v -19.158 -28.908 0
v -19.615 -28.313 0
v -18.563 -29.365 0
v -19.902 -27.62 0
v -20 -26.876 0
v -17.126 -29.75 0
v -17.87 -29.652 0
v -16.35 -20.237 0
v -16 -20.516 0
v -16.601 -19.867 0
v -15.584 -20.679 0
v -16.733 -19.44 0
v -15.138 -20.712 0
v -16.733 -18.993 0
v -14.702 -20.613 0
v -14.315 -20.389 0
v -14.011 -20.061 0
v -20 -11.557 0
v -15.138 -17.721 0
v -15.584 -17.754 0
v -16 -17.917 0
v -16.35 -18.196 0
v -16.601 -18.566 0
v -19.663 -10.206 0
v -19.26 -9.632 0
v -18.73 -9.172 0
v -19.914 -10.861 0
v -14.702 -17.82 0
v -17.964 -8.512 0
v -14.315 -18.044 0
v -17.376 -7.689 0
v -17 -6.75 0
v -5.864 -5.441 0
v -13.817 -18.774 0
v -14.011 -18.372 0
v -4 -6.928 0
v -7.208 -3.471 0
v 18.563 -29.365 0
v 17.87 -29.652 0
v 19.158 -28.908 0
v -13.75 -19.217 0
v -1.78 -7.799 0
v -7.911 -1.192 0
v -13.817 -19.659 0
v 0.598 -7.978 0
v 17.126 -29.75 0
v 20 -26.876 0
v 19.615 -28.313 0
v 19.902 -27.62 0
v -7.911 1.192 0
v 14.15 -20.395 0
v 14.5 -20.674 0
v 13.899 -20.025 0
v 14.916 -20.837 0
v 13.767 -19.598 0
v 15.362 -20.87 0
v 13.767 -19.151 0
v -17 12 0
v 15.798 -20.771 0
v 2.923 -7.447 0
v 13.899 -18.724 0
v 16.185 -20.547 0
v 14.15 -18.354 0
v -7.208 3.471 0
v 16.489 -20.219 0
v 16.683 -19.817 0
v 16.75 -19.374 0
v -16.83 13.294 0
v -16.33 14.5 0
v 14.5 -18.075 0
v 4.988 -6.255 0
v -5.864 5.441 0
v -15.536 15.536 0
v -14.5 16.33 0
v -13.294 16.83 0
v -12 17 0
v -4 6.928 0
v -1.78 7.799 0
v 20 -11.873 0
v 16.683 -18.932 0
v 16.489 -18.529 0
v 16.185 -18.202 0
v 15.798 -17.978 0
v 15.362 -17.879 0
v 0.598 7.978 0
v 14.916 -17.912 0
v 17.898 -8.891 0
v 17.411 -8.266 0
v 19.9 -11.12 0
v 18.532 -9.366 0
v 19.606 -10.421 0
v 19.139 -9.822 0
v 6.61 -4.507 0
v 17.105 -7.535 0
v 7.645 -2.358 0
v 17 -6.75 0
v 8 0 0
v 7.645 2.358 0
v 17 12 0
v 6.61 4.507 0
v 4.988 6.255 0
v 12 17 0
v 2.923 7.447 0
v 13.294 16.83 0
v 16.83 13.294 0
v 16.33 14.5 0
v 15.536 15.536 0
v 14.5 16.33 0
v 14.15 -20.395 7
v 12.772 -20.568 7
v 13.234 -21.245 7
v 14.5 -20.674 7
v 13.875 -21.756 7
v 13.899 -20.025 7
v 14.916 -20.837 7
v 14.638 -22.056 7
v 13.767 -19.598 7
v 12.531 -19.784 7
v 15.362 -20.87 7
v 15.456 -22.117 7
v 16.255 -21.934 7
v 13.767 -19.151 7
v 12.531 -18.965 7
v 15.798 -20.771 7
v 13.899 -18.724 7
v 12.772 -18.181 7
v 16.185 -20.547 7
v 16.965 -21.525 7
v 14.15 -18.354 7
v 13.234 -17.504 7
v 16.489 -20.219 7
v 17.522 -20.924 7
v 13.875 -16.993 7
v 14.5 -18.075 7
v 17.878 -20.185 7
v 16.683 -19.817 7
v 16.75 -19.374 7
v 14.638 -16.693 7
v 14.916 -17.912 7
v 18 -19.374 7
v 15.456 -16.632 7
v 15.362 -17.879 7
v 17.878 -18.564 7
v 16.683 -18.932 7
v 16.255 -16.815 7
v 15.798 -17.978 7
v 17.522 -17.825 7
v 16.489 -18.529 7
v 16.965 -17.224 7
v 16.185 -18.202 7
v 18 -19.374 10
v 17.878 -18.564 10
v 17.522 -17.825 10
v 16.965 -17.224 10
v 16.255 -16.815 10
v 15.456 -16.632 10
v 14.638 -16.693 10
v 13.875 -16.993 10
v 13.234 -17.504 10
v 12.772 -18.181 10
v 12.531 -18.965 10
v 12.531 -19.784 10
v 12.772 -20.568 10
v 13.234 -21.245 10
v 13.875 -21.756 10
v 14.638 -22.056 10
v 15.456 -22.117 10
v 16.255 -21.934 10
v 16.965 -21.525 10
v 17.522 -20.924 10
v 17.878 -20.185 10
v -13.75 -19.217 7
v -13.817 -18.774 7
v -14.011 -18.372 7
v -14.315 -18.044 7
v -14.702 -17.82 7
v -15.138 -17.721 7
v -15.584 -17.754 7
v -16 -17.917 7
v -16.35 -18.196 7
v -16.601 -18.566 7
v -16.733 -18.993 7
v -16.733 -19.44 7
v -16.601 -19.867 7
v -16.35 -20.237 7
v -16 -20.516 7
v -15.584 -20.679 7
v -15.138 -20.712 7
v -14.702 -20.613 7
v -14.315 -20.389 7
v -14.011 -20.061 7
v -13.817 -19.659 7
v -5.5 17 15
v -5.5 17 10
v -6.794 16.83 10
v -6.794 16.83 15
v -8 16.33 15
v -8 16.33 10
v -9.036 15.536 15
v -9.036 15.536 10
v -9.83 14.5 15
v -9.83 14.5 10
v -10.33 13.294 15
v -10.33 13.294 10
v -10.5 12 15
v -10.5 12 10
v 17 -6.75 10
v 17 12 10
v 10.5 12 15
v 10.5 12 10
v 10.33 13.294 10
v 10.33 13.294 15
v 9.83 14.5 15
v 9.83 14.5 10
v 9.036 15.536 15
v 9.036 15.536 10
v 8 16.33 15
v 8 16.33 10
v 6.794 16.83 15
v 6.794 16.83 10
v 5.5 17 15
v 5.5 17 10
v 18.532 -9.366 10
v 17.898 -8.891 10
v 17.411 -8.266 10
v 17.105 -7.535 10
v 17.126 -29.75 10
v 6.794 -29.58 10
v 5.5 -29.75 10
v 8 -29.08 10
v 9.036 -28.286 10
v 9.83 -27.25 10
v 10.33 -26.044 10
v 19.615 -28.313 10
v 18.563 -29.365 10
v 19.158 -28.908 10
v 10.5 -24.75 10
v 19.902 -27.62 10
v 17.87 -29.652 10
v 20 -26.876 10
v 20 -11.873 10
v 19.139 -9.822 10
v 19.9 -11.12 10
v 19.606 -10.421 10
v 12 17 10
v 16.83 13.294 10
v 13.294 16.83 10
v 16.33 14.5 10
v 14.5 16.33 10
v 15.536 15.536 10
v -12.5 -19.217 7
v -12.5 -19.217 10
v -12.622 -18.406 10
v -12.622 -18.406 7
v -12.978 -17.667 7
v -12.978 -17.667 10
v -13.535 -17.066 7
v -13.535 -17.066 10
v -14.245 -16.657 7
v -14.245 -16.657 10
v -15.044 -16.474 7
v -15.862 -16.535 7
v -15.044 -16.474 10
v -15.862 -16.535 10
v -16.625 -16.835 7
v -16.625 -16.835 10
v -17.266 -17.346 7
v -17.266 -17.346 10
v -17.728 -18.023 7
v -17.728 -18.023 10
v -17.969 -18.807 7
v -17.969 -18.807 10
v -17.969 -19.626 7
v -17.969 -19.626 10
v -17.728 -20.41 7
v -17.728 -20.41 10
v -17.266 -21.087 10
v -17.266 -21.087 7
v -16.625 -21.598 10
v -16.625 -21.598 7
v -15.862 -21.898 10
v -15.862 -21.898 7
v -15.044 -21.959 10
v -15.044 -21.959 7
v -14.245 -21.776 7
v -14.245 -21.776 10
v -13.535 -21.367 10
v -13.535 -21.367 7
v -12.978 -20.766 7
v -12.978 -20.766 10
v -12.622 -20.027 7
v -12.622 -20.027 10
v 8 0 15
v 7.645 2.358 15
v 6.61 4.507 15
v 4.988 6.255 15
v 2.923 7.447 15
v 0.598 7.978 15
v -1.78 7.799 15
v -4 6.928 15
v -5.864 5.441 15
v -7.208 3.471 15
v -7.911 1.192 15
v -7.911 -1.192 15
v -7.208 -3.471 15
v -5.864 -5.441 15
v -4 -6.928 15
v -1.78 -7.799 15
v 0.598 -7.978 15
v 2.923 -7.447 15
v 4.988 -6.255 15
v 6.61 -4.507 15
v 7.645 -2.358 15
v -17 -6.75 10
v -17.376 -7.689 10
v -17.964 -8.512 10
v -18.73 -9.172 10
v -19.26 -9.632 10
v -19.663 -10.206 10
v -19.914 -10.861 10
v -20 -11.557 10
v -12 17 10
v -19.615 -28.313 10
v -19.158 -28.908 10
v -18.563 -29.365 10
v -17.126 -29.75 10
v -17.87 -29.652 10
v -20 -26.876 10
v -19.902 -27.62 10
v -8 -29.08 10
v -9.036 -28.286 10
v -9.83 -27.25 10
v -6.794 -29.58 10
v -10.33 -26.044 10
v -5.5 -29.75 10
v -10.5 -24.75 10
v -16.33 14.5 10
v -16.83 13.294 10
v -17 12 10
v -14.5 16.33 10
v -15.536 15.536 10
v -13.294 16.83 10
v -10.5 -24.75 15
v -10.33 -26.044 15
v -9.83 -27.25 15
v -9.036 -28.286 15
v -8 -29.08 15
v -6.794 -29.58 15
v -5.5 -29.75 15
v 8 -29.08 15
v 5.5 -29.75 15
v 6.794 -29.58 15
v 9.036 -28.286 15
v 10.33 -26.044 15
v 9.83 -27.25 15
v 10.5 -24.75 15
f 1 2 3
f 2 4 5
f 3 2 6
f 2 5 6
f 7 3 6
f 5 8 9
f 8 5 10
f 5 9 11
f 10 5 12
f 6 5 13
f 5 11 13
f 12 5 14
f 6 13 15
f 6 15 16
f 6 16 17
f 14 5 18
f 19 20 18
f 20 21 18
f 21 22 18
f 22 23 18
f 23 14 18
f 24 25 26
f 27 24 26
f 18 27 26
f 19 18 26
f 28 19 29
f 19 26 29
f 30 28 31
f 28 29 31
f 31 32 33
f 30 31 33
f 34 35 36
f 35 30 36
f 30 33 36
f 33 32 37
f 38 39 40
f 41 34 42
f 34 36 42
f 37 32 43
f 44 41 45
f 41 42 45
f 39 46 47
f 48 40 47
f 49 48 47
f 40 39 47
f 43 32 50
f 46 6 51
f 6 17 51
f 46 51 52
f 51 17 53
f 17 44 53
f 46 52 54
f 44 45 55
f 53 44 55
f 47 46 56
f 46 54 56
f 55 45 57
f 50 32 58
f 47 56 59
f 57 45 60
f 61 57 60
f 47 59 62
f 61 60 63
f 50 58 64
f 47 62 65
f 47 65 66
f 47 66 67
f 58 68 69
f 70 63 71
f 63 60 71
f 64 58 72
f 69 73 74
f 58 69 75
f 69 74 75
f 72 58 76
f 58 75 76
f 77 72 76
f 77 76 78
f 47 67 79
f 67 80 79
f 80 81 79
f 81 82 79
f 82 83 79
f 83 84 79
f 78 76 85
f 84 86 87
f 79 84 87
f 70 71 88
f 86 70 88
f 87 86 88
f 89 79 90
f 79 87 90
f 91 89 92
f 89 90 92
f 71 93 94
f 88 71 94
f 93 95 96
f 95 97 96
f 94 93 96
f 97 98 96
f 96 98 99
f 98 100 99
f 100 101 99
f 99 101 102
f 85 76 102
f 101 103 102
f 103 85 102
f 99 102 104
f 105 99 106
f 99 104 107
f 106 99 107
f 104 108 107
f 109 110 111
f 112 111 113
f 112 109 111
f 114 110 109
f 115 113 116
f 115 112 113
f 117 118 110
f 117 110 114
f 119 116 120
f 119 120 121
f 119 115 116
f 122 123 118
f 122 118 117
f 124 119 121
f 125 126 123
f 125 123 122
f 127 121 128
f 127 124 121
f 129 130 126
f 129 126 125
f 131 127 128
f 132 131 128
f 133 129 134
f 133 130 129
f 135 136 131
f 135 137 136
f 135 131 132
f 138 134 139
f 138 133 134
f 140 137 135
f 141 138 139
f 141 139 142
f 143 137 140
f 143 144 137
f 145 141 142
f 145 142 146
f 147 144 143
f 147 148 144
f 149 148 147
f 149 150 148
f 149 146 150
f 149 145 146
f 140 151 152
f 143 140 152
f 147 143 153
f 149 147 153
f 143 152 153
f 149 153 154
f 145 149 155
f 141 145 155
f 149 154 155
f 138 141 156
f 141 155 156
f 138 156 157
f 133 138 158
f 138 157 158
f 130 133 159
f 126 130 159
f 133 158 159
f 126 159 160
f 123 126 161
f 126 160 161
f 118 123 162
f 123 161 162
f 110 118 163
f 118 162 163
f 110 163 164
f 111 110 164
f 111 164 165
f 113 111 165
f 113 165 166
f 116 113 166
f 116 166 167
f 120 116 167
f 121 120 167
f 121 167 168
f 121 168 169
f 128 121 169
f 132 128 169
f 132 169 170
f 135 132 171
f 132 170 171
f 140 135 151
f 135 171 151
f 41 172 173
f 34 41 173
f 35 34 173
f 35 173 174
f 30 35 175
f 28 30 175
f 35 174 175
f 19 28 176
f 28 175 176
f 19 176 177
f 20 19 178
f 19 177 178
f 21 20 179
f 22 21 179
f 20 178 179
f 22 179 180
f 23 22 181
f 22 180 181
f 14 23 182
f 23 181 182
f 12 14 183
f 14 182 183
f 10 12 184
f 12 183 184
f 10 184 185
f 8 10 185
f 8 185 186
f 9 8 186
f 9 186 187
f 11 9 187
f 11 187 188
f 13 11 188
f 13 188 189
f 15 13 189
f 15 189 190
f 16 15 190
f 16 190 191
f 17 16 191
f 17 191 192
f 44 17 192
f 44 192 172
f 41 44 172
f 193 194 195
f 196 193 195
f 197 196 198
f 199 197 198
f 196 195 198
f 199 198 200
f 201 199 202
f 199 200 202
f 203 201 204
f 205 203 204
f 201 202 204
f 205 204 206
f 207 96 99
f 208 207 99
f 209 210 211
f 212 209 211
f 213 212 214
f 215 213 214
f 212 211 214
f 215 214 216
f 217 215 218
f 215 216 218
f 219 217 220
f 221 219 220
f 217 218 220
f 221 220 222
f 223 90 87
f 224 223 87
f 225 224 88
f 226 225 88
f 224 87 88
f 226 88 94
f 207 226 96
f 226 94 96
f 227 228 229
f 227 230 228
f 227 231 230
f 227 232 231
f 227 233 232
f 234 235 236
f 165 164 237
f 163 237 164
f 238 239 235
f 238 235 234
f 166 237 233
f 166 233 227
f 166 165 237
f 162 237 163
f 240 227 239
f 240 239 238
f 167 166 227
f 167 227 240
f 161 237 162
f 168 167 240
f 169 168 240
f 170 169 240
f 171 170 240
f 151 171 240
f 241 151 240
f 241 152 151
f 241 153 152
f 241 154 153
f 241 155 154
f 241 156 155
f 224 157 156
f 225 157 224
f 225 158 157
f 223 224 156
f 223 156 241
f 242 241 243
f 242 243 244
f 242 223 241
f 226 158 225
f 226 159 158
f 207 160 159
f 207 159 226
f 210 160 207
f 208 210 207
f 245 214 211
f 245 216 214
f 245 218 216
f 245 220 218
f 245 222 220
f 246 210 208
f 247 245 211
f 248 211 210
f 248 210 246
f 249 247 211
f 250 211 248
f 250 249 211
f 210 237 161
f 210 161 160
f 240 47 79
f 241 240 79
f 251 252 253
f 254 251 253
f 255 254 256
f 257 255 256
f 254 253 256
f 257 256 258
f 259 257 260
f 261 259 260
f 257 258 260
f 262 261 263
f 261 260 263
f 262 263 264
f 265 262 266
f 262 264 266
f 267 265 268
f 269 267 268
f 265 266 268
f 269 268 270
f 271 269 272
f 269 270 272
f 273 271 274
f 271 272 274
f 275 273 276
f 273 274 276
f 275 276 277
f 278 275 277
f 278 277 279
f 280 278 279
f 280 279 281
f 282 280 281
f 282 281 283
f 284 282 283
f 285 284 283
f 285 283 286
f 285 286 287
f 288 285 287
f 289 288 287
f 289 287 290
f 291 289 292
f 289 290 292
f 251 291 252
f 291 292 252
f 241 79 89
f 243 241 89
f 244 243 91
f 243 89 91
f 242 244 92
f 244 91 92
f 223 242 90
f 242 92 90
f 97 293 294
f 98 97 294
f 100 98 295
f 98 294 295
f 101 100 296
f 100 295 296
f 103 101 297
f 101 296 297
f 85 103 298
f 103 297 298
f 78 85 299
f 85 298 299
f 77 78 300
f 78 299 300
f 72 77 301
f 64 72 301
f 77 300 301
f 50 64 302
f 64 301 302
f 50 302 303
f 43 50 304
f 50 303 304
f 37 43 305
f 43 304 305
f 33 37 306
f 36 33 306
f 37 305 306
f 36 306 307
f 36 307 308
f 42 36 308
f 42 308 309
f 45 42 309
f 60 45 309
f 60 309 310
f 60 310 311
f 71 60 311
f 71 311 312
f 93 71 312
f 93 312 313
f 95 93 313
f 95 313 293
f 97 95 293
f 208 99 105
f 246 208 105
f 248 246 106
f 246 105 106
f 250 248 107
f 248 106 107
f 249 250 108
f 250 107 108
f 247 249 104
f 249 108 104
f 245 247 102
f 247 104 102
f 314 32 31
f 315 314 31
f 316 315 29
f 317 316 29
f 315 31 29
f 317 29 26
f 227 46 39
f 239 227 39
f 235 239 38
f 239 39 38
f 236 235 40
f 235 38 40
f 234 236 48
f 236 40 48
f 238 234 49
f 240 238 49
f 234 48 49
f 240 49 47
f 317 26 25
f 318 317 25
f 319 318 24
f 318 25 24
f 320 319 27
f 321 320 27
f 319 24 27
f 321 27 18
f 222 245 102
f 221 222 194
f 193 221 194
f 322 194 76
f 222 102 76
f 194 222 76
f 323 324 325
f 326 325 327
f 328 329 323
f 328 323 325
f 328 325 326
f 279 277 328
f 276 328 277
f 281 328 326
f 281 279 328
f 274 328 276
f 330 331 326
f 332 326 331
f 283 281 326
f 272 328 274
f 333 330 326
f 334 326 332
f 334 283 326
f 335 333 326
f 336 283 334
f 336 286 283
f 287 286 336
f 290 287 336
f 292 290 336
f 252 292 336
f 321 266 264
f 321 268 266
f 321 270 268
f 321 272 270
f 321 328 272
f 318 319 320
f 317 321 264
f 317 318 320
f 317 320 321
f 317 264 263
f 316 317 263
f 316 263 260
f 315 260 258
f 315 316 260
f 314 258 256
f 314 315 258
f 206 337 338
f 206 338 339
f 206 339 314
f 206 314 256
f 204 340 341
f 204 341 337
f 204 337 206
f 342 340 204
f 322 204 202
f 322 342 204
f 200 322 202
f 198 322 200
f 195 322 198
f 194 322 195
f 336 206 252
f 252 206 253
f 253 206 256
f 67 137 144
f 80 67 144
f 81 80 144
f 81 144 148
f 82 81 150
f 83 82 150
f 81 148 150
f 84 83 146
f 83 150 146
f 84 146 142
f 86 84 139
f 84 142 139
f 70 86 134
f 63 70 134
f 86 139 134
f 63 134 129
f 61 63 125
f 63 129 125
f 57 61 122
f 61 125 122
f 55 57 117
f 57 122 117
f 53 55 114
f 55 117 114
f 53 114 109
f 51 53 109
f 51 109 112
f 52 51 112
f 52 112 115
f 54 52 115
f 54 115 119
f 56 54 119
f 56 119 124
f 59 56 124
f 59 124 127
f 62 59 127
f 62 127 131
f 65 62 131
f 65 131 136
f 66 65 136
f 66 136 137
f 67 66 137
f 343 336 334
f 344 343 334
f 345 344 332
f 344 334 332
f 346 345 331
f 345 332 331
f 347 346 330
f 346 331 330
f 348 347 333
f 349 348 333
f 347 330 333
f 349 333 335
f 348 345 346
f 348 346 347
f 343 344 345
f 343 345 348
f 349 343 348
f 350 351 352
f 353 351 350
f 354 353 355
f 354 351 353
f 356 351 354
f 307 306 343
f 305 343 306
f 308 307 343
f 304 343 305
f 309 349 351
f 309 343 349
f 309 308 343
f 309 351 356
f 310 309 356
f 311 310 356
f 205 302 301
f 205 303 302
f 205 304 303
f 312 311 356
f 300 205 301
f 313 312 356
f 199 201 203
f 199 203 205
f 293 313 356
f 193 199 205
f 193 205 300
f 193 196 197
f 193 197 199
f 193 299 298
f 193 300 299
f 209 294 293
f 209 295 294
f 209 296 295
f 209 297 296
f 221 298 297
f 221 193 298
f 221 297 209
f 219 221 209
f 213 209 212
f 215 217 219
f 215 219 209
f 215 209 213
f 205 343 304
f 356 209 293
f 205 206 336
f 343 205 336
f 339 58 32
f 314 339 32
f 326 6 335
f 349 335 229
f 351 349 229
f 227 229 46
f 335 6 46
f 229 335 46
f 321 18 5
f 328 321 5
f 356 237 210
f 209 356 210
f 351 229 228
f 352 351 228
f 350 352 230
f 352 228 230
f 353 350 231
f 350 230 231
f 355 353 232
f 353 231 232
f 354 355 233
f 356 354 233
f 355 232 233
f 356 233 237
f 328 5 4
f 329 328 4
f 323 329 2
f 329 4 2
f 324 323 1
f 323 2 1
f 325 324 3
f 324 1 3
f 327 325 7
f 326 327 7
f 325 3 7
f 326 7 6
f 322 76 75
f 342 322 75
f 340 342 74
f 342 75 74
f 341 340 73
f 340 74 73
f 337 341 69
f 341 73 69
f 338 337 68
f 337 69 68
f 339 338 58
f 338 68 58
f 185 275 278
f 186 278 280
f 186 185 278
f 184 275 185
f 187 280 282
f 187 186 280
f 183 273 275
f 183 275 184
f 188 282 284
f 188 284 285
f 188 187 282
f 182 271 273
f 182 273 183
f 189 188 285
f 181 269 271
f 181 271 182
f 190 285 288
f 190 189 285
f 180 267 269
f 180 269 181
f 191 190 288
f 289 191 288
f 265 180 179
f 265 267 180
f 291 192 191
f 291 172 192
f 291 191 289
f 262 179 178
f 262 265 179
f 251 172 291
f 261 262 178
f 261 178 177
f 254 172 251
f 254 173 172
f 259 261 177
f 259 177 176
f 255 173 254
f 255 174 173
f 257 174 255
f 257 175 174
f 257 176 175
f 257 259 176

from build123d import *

# Parameters (mm, degrees)
F1_DEPTH  = 10
F3_DEPTH  = 5
F4_R      = 8
F5_DEPTH  = 25
F6_R      = 2.75
F6_R_2    = 1.5
F7_DEPTH  = 3
F8_DEPTH  = 25
F9_R      = 2.75
F9_R_2    = 1.5
F10_DEPTH = 3
F11_DEPTH = 25


with BuildPart() as f1:
    # F0 (on Top) → F1 (new body)
    with BuildSketch(Plane.XY):
        with BuildLine():
            Line((-17.1261427557, -29.75), (17.1261427557, -29.75))
            ThreePointArc((17.1261427557, -29.75), (19.1582667013, -28.9082667013), (20, -26.8761427557))
            Line((20, -26.8761427557), (20, -11.87280621))
            ThreePointArc((20, -11.87280621), (19.6060520694, -10.4205303214), (18.5322129268, -9.3664099655))
            ThreePointArc((18.5322129268, -9.3664099655), (17.4112395611, -8.2660209069), (17, -6.75))
            Line((17, -6.75), (17, 12))
            ThreePointArc((17, 12), (15.5355339059, 15.5355339059), (12, 17))
            Line((12, 17), (-12, 17))
            ThreePointArc((-12, 17), (-15.5355339059, 15.5355339059), (-17, 12))
            Line((-17, 12), (-17, -6.75))
            ThreePointArc((-17, -6.75), (-17.6456554571, -8.1178497679), (-18.730129695, -9.1722688421))
            ThreePointArc((-18.730129695, -9.1722688421), (-19.6627433299, -10.206041959), (-20, -11.5568613354))
            Line((-20, -11.5568613354), (-20, -26.8761427557))
            ThreePointArc((-20, -26.8761427557), (-19.1582667013, -28.9082667013), (-17.1261427557, -29.75))
        make_face()
    extrude(amount=F1_DEPTH)

    # F2 (on face) → F3 (join)
    with BuildSketch(Plane.XY.offset(10)):
        with BuildLine():
            Line((-10.5, 12), (-10.5, -24.75))
            ThreePointArc((-10.5, -24.75), (-9.0355339059, -28.2855339059), (-5.5, -29.75))
            Line((-5.5, -29.75), (5.5, -29.75))
            ThreePointArc((5.5, -29.75), (9.0355339059, -28.2855339059), (10.5, -24.75))
            Line((10.5, -24.75), (10.5, 12))
            ThreePointArc((10.5, 12), (9.0355339059, 15.5355339059), (5.5, 17))
            Line((5.5, 17), (-5.5, 17))
            ThreePointArc((-5.5, 17), (-9.0355339059, 15.5355339059), (-10.5, 12))
        make_face()
    extrude(amount=F3_DEPTH)

    # F4 (on face) → F5 (cut)
    with BuildSketch(Plane.XY.offset(15)):
        Circle(F4_R)
    extrude(amount=-F5_DEPTH, mode=Mode.SUBTRACT)

    # F6 (on face) → F7 (cut)
    with BuildSketch(Plane.XY.offset(10)):
        with Locations((-15.25, -19.2165020456)):
            Circle(F6_R)
        with Locations((-15.25, -19.2165020456)):
            Circle(F6_R_2, mode=Mode.SUBTRACT)
    extrude(amount=-F7_DEPTH, mode=Mode.SUBTRACT)

    # F8 (cut): a face of the model
    f8_faces = [f1.faces().sort_by_distance(p)[0] for p in [
        (-15.25, -19.2165020456, 10),
    ]]
    extrude(f8_faces, amount=-F8_DEPTH, mode=Mode.SUBTRACT)

    # F9 (on face) → F10 (cut)
    with BuildSketch(Plane.XY.offset(10)):
        with Locations((15.25, -19.3744744829)):
            Circle(F9_R)
        with Locations((15.25, -19.3744744829)):
            Circle(F9_R_2, mode=Mode.SUBTRACT)
    extrude(amount=-F10_DEPTH, mode=Mode.SUBTRACT)

    # F11 (cut): a face of the model
    f11_faces = [f1.faces().sort_by_distance(p)[0] for p in [
        (15.25, -19.3744744829, 10),
    ]]
    extrude(f11_faces, amount=-F11_DEPTH, mode=Mode.SUBTRACT)


solid = f1.part
